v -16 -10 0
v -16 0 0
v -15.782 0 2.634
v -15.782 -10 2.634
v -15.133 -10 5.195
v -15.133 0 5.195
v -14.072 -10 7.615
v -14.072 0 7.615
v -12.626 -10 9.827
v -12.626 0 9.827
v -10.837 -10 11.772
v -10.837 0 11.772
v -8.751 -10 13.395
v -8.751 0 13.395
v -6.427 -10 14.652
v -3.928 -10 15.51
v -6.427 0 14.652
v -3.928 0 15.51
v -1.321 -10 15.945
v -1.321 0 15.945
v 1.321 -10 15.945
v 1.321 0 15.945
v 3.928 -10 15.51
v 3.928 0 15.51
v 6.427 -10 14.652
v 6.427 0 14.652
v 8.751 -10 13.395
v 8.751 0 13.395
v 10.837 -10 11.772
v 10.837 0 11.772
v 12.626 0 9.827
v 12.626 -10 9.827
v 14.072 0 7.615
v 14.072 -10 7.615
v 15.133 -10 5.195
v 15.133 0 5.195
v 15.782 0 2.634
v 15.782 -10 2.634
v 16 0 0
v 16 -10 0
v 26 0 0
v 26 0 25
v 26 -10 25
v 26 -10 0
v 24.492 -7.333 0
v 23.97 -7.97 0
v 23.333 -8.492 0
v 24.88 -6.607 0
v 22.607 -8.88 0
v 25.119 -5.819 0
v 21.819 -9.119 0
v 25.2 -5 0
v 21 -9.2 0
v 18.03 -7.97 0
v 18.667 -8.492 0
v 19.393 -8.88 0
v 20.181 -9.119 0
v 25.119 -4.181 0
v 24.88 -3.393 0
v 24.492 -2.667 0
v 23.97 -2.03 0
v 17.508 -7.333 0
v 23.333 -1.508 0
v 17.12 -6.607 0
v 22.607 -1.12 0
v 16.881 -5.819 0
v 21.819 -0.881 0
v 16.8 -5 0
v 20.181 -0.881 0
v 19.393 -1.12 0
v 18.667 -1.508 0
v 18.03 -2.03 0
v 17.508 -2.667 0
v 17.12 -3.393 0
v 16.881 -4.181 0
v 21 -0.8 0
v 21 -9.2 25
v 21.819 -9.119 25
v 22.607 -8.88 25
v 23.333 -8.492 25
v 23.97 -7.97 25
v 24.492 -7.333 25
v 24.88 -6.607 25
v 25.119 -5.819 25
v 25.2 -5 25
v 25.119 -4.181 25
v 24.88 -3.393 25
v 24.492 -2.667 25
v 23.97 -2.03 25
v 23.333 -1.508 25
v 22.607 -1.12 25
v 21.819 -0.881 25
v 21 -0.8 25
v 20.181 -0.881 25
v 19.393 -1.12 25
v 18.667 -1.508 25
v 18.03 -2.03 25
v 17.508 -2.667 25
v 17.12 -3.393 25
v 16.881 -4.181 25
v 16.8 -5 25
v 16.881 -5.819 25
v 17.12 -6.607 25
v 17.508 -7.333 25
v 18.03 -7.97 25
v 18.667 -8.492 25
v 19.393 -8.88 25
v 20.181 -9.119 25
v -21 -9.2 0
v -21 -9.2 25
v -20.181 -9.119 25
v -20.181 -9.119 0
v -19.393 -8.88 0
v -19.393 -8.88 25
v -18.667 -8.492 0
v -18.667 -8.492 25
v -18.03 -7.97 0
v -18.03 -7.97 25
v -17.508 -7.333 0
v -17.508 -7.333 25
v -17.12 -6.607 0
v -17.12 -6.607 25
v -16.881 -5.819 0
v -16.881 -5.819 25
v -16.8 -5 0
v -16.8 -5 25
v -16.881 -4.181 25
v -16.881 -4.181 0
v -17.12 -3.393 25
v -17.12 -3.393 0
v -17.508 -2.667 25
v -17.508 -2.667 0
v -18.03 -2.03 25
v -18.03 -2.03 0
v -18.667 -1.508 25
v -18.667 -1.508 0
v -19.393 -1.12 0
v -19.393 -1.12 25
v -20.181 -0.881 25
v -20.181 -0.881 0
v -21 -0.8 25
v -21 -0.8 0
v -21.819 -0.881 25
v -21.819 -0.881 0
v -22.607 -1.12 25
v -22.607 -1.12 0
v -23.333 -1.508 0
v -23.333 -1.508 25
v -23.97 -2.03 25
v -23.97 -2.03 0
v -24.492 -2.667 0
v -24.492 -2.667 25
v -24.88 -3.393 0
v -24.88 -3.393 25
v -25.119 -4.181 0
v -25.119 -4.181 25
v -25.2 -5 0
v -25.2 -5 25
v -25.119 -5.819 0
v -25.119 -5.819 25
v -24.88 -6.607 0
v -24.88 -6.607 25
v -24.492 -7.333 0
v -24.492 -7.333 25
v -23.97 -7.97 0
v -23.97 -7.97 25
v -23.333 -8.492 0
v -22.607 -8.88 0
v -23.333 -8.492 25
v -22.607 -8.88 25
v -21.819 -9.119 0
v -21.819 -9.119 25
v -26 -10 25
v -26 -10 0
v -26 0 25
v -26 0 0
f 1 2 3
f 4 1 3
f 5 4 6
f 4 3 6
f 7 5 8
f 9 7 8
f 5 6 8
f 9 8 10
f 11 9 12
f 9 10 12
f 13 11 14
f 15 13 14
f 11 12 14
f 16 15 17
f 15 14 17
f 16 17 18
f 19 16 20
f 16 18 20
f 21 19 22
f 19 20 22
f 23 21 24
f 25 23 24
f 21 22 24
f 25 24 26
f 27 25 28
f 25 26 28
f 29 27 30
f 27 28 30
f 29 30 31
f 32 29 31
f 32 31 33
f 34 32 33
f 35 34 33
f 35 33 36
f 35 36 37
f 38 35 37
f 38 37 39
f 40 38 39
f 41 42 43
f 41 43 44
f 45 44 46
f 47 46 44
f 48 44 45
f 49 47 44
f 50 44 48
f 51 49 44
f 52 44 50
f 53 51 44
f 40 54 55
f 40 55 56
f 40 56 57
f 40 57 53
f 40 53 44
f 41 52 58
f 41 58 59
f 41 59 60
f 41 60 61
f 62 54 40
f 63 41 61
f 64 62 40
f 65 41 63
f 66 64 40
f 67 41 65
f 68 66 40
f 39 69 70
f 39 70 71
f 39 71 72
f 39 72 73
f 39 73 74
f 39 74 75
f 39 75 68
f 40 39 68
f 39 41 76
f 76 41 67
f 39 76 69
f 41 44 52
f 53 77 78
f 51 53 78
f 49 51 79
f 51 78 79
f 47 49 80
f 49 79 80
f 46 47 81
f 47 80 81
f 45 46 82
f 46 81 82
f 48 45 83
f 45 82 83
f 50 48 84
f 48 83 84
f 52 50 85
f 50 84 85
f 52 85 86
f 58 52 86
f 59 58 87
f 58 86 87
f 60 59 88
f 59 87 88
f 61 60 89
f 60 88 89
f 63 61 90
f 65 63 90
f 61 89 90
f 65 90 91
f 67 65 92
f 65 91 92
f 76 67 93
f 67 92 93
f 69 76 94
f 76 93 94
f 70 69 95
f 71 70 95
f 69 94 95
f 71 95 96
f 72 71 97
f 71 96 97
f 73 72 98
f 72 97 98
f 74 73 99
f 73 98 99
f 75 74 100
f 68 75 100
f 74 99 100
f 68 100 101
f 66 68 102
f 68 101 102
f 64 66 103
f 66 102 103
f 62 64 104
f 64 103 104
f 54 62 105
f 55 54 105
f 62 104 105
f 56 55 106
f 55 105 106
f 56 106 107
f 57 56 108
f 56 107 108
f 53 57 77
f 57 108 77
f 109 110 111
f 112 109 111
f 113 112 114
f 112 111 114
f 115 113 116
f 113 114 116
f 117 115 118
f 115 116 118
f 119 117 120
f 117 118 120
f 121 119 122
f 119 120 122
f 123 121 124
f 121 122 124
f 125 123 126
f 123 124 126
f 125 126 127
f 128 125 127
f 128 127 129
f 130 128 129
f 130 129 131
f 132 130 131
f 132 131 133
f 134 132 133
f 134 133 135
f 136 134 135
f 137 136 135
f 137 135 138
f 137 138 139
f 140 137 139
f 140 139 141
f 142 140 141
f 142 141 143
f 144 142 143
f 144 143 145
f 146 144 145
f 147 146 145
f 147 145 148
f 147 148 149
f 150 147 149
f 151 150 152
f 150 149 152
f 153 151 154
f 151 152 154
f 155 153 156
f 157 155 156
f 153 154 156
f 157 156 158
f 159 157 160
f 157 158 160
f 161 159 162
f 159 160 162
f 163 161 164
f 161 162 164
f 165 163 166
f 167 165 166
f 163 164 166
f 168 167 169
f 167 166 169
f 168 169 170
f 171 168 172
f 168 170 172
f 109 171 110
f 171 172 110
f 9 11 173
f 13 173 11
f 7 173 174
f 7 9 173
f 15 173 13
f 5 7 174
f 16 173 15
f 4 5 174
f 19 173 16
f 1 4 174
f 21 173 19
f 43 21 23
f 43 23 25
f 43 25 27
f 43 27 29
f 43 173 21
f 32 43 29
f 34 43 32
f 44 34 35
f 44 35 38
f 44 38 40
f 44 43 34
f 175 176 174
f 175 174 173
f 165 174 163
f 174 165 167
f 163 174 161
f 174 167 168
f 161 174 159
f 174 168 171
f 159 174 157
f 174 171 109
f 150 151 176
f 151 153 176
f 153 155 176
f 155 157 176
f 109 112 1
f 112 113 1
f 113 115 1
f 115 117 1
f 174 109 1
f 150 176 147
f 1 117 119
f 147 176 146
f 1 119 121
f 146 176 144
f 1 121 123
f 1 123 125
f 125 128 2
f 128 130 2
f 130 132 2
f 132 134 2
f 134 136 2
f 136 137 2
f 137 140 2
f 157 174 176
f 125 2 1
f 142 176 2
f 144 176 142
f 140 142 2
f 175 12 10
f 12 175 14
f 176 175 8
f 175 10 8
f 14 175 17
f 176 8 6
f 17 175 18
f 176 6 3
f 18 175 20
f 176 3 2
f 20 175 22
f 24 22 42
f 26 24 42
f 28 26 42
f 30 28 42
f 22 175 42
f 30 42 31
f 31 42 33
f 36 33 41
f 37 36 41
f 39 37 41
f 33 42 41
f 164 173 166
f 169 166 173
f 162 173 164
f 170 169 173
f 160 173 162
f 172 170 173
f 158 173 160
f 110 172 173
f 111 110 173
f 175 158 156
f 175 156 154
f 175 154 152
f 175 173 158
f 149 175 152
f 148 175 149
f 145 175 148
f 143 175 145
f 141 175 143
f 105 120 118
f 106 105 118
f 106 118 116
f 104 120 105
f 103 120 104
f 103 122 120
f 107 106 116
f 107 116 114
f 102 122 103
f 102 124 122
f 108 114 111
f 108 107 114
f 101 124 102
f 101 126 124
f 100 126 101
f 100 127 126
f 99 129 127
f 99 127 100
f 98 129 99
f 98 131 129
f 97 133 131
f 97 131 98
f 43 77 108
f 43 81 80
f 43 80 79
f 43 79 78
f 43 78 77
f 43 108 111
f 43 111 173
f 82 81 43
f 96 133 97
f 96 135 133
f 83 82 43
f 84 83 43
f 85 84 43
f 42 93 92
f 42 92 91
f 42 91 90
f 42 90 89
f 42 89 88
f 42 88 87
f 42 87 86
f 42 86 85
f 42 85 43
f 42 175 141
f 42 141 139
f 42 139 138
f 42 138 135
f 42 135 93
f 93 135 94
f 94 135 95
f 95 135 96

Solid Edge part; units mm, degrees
sketch "Sketch1" plane through (0, 0, 0) normal (0, -1, 0) x (1, 0, 0)
  line L0 (-26, 0) -> (-16, 0)
  arc A0 (-16, 0) -> (16, 0) centre (0, 0) cw
  line L1 (26, 0) -> (16, 0)
  line L2 (26, 25) -> (26, 0)
  line L3 (-26, 25) -> (26, 25)
  line L4 (-26, 0) -> (-26, 25)
  dimension "D1" = 10
  dimension "D2" = 16
  dimension "D3" = 25
extrude "Protrusion1" add sketch "Sketch1" along normal blind 10
hole "Hole_1" at (-21, -5, 25) direction (0, 0, -1) diameter 8.4 end up to next
hole "Hole1" at (21, -5, 25) direction (0, 0, -1) diameter 8.4 end up to next
properties material "Stainless Steel, 420"
